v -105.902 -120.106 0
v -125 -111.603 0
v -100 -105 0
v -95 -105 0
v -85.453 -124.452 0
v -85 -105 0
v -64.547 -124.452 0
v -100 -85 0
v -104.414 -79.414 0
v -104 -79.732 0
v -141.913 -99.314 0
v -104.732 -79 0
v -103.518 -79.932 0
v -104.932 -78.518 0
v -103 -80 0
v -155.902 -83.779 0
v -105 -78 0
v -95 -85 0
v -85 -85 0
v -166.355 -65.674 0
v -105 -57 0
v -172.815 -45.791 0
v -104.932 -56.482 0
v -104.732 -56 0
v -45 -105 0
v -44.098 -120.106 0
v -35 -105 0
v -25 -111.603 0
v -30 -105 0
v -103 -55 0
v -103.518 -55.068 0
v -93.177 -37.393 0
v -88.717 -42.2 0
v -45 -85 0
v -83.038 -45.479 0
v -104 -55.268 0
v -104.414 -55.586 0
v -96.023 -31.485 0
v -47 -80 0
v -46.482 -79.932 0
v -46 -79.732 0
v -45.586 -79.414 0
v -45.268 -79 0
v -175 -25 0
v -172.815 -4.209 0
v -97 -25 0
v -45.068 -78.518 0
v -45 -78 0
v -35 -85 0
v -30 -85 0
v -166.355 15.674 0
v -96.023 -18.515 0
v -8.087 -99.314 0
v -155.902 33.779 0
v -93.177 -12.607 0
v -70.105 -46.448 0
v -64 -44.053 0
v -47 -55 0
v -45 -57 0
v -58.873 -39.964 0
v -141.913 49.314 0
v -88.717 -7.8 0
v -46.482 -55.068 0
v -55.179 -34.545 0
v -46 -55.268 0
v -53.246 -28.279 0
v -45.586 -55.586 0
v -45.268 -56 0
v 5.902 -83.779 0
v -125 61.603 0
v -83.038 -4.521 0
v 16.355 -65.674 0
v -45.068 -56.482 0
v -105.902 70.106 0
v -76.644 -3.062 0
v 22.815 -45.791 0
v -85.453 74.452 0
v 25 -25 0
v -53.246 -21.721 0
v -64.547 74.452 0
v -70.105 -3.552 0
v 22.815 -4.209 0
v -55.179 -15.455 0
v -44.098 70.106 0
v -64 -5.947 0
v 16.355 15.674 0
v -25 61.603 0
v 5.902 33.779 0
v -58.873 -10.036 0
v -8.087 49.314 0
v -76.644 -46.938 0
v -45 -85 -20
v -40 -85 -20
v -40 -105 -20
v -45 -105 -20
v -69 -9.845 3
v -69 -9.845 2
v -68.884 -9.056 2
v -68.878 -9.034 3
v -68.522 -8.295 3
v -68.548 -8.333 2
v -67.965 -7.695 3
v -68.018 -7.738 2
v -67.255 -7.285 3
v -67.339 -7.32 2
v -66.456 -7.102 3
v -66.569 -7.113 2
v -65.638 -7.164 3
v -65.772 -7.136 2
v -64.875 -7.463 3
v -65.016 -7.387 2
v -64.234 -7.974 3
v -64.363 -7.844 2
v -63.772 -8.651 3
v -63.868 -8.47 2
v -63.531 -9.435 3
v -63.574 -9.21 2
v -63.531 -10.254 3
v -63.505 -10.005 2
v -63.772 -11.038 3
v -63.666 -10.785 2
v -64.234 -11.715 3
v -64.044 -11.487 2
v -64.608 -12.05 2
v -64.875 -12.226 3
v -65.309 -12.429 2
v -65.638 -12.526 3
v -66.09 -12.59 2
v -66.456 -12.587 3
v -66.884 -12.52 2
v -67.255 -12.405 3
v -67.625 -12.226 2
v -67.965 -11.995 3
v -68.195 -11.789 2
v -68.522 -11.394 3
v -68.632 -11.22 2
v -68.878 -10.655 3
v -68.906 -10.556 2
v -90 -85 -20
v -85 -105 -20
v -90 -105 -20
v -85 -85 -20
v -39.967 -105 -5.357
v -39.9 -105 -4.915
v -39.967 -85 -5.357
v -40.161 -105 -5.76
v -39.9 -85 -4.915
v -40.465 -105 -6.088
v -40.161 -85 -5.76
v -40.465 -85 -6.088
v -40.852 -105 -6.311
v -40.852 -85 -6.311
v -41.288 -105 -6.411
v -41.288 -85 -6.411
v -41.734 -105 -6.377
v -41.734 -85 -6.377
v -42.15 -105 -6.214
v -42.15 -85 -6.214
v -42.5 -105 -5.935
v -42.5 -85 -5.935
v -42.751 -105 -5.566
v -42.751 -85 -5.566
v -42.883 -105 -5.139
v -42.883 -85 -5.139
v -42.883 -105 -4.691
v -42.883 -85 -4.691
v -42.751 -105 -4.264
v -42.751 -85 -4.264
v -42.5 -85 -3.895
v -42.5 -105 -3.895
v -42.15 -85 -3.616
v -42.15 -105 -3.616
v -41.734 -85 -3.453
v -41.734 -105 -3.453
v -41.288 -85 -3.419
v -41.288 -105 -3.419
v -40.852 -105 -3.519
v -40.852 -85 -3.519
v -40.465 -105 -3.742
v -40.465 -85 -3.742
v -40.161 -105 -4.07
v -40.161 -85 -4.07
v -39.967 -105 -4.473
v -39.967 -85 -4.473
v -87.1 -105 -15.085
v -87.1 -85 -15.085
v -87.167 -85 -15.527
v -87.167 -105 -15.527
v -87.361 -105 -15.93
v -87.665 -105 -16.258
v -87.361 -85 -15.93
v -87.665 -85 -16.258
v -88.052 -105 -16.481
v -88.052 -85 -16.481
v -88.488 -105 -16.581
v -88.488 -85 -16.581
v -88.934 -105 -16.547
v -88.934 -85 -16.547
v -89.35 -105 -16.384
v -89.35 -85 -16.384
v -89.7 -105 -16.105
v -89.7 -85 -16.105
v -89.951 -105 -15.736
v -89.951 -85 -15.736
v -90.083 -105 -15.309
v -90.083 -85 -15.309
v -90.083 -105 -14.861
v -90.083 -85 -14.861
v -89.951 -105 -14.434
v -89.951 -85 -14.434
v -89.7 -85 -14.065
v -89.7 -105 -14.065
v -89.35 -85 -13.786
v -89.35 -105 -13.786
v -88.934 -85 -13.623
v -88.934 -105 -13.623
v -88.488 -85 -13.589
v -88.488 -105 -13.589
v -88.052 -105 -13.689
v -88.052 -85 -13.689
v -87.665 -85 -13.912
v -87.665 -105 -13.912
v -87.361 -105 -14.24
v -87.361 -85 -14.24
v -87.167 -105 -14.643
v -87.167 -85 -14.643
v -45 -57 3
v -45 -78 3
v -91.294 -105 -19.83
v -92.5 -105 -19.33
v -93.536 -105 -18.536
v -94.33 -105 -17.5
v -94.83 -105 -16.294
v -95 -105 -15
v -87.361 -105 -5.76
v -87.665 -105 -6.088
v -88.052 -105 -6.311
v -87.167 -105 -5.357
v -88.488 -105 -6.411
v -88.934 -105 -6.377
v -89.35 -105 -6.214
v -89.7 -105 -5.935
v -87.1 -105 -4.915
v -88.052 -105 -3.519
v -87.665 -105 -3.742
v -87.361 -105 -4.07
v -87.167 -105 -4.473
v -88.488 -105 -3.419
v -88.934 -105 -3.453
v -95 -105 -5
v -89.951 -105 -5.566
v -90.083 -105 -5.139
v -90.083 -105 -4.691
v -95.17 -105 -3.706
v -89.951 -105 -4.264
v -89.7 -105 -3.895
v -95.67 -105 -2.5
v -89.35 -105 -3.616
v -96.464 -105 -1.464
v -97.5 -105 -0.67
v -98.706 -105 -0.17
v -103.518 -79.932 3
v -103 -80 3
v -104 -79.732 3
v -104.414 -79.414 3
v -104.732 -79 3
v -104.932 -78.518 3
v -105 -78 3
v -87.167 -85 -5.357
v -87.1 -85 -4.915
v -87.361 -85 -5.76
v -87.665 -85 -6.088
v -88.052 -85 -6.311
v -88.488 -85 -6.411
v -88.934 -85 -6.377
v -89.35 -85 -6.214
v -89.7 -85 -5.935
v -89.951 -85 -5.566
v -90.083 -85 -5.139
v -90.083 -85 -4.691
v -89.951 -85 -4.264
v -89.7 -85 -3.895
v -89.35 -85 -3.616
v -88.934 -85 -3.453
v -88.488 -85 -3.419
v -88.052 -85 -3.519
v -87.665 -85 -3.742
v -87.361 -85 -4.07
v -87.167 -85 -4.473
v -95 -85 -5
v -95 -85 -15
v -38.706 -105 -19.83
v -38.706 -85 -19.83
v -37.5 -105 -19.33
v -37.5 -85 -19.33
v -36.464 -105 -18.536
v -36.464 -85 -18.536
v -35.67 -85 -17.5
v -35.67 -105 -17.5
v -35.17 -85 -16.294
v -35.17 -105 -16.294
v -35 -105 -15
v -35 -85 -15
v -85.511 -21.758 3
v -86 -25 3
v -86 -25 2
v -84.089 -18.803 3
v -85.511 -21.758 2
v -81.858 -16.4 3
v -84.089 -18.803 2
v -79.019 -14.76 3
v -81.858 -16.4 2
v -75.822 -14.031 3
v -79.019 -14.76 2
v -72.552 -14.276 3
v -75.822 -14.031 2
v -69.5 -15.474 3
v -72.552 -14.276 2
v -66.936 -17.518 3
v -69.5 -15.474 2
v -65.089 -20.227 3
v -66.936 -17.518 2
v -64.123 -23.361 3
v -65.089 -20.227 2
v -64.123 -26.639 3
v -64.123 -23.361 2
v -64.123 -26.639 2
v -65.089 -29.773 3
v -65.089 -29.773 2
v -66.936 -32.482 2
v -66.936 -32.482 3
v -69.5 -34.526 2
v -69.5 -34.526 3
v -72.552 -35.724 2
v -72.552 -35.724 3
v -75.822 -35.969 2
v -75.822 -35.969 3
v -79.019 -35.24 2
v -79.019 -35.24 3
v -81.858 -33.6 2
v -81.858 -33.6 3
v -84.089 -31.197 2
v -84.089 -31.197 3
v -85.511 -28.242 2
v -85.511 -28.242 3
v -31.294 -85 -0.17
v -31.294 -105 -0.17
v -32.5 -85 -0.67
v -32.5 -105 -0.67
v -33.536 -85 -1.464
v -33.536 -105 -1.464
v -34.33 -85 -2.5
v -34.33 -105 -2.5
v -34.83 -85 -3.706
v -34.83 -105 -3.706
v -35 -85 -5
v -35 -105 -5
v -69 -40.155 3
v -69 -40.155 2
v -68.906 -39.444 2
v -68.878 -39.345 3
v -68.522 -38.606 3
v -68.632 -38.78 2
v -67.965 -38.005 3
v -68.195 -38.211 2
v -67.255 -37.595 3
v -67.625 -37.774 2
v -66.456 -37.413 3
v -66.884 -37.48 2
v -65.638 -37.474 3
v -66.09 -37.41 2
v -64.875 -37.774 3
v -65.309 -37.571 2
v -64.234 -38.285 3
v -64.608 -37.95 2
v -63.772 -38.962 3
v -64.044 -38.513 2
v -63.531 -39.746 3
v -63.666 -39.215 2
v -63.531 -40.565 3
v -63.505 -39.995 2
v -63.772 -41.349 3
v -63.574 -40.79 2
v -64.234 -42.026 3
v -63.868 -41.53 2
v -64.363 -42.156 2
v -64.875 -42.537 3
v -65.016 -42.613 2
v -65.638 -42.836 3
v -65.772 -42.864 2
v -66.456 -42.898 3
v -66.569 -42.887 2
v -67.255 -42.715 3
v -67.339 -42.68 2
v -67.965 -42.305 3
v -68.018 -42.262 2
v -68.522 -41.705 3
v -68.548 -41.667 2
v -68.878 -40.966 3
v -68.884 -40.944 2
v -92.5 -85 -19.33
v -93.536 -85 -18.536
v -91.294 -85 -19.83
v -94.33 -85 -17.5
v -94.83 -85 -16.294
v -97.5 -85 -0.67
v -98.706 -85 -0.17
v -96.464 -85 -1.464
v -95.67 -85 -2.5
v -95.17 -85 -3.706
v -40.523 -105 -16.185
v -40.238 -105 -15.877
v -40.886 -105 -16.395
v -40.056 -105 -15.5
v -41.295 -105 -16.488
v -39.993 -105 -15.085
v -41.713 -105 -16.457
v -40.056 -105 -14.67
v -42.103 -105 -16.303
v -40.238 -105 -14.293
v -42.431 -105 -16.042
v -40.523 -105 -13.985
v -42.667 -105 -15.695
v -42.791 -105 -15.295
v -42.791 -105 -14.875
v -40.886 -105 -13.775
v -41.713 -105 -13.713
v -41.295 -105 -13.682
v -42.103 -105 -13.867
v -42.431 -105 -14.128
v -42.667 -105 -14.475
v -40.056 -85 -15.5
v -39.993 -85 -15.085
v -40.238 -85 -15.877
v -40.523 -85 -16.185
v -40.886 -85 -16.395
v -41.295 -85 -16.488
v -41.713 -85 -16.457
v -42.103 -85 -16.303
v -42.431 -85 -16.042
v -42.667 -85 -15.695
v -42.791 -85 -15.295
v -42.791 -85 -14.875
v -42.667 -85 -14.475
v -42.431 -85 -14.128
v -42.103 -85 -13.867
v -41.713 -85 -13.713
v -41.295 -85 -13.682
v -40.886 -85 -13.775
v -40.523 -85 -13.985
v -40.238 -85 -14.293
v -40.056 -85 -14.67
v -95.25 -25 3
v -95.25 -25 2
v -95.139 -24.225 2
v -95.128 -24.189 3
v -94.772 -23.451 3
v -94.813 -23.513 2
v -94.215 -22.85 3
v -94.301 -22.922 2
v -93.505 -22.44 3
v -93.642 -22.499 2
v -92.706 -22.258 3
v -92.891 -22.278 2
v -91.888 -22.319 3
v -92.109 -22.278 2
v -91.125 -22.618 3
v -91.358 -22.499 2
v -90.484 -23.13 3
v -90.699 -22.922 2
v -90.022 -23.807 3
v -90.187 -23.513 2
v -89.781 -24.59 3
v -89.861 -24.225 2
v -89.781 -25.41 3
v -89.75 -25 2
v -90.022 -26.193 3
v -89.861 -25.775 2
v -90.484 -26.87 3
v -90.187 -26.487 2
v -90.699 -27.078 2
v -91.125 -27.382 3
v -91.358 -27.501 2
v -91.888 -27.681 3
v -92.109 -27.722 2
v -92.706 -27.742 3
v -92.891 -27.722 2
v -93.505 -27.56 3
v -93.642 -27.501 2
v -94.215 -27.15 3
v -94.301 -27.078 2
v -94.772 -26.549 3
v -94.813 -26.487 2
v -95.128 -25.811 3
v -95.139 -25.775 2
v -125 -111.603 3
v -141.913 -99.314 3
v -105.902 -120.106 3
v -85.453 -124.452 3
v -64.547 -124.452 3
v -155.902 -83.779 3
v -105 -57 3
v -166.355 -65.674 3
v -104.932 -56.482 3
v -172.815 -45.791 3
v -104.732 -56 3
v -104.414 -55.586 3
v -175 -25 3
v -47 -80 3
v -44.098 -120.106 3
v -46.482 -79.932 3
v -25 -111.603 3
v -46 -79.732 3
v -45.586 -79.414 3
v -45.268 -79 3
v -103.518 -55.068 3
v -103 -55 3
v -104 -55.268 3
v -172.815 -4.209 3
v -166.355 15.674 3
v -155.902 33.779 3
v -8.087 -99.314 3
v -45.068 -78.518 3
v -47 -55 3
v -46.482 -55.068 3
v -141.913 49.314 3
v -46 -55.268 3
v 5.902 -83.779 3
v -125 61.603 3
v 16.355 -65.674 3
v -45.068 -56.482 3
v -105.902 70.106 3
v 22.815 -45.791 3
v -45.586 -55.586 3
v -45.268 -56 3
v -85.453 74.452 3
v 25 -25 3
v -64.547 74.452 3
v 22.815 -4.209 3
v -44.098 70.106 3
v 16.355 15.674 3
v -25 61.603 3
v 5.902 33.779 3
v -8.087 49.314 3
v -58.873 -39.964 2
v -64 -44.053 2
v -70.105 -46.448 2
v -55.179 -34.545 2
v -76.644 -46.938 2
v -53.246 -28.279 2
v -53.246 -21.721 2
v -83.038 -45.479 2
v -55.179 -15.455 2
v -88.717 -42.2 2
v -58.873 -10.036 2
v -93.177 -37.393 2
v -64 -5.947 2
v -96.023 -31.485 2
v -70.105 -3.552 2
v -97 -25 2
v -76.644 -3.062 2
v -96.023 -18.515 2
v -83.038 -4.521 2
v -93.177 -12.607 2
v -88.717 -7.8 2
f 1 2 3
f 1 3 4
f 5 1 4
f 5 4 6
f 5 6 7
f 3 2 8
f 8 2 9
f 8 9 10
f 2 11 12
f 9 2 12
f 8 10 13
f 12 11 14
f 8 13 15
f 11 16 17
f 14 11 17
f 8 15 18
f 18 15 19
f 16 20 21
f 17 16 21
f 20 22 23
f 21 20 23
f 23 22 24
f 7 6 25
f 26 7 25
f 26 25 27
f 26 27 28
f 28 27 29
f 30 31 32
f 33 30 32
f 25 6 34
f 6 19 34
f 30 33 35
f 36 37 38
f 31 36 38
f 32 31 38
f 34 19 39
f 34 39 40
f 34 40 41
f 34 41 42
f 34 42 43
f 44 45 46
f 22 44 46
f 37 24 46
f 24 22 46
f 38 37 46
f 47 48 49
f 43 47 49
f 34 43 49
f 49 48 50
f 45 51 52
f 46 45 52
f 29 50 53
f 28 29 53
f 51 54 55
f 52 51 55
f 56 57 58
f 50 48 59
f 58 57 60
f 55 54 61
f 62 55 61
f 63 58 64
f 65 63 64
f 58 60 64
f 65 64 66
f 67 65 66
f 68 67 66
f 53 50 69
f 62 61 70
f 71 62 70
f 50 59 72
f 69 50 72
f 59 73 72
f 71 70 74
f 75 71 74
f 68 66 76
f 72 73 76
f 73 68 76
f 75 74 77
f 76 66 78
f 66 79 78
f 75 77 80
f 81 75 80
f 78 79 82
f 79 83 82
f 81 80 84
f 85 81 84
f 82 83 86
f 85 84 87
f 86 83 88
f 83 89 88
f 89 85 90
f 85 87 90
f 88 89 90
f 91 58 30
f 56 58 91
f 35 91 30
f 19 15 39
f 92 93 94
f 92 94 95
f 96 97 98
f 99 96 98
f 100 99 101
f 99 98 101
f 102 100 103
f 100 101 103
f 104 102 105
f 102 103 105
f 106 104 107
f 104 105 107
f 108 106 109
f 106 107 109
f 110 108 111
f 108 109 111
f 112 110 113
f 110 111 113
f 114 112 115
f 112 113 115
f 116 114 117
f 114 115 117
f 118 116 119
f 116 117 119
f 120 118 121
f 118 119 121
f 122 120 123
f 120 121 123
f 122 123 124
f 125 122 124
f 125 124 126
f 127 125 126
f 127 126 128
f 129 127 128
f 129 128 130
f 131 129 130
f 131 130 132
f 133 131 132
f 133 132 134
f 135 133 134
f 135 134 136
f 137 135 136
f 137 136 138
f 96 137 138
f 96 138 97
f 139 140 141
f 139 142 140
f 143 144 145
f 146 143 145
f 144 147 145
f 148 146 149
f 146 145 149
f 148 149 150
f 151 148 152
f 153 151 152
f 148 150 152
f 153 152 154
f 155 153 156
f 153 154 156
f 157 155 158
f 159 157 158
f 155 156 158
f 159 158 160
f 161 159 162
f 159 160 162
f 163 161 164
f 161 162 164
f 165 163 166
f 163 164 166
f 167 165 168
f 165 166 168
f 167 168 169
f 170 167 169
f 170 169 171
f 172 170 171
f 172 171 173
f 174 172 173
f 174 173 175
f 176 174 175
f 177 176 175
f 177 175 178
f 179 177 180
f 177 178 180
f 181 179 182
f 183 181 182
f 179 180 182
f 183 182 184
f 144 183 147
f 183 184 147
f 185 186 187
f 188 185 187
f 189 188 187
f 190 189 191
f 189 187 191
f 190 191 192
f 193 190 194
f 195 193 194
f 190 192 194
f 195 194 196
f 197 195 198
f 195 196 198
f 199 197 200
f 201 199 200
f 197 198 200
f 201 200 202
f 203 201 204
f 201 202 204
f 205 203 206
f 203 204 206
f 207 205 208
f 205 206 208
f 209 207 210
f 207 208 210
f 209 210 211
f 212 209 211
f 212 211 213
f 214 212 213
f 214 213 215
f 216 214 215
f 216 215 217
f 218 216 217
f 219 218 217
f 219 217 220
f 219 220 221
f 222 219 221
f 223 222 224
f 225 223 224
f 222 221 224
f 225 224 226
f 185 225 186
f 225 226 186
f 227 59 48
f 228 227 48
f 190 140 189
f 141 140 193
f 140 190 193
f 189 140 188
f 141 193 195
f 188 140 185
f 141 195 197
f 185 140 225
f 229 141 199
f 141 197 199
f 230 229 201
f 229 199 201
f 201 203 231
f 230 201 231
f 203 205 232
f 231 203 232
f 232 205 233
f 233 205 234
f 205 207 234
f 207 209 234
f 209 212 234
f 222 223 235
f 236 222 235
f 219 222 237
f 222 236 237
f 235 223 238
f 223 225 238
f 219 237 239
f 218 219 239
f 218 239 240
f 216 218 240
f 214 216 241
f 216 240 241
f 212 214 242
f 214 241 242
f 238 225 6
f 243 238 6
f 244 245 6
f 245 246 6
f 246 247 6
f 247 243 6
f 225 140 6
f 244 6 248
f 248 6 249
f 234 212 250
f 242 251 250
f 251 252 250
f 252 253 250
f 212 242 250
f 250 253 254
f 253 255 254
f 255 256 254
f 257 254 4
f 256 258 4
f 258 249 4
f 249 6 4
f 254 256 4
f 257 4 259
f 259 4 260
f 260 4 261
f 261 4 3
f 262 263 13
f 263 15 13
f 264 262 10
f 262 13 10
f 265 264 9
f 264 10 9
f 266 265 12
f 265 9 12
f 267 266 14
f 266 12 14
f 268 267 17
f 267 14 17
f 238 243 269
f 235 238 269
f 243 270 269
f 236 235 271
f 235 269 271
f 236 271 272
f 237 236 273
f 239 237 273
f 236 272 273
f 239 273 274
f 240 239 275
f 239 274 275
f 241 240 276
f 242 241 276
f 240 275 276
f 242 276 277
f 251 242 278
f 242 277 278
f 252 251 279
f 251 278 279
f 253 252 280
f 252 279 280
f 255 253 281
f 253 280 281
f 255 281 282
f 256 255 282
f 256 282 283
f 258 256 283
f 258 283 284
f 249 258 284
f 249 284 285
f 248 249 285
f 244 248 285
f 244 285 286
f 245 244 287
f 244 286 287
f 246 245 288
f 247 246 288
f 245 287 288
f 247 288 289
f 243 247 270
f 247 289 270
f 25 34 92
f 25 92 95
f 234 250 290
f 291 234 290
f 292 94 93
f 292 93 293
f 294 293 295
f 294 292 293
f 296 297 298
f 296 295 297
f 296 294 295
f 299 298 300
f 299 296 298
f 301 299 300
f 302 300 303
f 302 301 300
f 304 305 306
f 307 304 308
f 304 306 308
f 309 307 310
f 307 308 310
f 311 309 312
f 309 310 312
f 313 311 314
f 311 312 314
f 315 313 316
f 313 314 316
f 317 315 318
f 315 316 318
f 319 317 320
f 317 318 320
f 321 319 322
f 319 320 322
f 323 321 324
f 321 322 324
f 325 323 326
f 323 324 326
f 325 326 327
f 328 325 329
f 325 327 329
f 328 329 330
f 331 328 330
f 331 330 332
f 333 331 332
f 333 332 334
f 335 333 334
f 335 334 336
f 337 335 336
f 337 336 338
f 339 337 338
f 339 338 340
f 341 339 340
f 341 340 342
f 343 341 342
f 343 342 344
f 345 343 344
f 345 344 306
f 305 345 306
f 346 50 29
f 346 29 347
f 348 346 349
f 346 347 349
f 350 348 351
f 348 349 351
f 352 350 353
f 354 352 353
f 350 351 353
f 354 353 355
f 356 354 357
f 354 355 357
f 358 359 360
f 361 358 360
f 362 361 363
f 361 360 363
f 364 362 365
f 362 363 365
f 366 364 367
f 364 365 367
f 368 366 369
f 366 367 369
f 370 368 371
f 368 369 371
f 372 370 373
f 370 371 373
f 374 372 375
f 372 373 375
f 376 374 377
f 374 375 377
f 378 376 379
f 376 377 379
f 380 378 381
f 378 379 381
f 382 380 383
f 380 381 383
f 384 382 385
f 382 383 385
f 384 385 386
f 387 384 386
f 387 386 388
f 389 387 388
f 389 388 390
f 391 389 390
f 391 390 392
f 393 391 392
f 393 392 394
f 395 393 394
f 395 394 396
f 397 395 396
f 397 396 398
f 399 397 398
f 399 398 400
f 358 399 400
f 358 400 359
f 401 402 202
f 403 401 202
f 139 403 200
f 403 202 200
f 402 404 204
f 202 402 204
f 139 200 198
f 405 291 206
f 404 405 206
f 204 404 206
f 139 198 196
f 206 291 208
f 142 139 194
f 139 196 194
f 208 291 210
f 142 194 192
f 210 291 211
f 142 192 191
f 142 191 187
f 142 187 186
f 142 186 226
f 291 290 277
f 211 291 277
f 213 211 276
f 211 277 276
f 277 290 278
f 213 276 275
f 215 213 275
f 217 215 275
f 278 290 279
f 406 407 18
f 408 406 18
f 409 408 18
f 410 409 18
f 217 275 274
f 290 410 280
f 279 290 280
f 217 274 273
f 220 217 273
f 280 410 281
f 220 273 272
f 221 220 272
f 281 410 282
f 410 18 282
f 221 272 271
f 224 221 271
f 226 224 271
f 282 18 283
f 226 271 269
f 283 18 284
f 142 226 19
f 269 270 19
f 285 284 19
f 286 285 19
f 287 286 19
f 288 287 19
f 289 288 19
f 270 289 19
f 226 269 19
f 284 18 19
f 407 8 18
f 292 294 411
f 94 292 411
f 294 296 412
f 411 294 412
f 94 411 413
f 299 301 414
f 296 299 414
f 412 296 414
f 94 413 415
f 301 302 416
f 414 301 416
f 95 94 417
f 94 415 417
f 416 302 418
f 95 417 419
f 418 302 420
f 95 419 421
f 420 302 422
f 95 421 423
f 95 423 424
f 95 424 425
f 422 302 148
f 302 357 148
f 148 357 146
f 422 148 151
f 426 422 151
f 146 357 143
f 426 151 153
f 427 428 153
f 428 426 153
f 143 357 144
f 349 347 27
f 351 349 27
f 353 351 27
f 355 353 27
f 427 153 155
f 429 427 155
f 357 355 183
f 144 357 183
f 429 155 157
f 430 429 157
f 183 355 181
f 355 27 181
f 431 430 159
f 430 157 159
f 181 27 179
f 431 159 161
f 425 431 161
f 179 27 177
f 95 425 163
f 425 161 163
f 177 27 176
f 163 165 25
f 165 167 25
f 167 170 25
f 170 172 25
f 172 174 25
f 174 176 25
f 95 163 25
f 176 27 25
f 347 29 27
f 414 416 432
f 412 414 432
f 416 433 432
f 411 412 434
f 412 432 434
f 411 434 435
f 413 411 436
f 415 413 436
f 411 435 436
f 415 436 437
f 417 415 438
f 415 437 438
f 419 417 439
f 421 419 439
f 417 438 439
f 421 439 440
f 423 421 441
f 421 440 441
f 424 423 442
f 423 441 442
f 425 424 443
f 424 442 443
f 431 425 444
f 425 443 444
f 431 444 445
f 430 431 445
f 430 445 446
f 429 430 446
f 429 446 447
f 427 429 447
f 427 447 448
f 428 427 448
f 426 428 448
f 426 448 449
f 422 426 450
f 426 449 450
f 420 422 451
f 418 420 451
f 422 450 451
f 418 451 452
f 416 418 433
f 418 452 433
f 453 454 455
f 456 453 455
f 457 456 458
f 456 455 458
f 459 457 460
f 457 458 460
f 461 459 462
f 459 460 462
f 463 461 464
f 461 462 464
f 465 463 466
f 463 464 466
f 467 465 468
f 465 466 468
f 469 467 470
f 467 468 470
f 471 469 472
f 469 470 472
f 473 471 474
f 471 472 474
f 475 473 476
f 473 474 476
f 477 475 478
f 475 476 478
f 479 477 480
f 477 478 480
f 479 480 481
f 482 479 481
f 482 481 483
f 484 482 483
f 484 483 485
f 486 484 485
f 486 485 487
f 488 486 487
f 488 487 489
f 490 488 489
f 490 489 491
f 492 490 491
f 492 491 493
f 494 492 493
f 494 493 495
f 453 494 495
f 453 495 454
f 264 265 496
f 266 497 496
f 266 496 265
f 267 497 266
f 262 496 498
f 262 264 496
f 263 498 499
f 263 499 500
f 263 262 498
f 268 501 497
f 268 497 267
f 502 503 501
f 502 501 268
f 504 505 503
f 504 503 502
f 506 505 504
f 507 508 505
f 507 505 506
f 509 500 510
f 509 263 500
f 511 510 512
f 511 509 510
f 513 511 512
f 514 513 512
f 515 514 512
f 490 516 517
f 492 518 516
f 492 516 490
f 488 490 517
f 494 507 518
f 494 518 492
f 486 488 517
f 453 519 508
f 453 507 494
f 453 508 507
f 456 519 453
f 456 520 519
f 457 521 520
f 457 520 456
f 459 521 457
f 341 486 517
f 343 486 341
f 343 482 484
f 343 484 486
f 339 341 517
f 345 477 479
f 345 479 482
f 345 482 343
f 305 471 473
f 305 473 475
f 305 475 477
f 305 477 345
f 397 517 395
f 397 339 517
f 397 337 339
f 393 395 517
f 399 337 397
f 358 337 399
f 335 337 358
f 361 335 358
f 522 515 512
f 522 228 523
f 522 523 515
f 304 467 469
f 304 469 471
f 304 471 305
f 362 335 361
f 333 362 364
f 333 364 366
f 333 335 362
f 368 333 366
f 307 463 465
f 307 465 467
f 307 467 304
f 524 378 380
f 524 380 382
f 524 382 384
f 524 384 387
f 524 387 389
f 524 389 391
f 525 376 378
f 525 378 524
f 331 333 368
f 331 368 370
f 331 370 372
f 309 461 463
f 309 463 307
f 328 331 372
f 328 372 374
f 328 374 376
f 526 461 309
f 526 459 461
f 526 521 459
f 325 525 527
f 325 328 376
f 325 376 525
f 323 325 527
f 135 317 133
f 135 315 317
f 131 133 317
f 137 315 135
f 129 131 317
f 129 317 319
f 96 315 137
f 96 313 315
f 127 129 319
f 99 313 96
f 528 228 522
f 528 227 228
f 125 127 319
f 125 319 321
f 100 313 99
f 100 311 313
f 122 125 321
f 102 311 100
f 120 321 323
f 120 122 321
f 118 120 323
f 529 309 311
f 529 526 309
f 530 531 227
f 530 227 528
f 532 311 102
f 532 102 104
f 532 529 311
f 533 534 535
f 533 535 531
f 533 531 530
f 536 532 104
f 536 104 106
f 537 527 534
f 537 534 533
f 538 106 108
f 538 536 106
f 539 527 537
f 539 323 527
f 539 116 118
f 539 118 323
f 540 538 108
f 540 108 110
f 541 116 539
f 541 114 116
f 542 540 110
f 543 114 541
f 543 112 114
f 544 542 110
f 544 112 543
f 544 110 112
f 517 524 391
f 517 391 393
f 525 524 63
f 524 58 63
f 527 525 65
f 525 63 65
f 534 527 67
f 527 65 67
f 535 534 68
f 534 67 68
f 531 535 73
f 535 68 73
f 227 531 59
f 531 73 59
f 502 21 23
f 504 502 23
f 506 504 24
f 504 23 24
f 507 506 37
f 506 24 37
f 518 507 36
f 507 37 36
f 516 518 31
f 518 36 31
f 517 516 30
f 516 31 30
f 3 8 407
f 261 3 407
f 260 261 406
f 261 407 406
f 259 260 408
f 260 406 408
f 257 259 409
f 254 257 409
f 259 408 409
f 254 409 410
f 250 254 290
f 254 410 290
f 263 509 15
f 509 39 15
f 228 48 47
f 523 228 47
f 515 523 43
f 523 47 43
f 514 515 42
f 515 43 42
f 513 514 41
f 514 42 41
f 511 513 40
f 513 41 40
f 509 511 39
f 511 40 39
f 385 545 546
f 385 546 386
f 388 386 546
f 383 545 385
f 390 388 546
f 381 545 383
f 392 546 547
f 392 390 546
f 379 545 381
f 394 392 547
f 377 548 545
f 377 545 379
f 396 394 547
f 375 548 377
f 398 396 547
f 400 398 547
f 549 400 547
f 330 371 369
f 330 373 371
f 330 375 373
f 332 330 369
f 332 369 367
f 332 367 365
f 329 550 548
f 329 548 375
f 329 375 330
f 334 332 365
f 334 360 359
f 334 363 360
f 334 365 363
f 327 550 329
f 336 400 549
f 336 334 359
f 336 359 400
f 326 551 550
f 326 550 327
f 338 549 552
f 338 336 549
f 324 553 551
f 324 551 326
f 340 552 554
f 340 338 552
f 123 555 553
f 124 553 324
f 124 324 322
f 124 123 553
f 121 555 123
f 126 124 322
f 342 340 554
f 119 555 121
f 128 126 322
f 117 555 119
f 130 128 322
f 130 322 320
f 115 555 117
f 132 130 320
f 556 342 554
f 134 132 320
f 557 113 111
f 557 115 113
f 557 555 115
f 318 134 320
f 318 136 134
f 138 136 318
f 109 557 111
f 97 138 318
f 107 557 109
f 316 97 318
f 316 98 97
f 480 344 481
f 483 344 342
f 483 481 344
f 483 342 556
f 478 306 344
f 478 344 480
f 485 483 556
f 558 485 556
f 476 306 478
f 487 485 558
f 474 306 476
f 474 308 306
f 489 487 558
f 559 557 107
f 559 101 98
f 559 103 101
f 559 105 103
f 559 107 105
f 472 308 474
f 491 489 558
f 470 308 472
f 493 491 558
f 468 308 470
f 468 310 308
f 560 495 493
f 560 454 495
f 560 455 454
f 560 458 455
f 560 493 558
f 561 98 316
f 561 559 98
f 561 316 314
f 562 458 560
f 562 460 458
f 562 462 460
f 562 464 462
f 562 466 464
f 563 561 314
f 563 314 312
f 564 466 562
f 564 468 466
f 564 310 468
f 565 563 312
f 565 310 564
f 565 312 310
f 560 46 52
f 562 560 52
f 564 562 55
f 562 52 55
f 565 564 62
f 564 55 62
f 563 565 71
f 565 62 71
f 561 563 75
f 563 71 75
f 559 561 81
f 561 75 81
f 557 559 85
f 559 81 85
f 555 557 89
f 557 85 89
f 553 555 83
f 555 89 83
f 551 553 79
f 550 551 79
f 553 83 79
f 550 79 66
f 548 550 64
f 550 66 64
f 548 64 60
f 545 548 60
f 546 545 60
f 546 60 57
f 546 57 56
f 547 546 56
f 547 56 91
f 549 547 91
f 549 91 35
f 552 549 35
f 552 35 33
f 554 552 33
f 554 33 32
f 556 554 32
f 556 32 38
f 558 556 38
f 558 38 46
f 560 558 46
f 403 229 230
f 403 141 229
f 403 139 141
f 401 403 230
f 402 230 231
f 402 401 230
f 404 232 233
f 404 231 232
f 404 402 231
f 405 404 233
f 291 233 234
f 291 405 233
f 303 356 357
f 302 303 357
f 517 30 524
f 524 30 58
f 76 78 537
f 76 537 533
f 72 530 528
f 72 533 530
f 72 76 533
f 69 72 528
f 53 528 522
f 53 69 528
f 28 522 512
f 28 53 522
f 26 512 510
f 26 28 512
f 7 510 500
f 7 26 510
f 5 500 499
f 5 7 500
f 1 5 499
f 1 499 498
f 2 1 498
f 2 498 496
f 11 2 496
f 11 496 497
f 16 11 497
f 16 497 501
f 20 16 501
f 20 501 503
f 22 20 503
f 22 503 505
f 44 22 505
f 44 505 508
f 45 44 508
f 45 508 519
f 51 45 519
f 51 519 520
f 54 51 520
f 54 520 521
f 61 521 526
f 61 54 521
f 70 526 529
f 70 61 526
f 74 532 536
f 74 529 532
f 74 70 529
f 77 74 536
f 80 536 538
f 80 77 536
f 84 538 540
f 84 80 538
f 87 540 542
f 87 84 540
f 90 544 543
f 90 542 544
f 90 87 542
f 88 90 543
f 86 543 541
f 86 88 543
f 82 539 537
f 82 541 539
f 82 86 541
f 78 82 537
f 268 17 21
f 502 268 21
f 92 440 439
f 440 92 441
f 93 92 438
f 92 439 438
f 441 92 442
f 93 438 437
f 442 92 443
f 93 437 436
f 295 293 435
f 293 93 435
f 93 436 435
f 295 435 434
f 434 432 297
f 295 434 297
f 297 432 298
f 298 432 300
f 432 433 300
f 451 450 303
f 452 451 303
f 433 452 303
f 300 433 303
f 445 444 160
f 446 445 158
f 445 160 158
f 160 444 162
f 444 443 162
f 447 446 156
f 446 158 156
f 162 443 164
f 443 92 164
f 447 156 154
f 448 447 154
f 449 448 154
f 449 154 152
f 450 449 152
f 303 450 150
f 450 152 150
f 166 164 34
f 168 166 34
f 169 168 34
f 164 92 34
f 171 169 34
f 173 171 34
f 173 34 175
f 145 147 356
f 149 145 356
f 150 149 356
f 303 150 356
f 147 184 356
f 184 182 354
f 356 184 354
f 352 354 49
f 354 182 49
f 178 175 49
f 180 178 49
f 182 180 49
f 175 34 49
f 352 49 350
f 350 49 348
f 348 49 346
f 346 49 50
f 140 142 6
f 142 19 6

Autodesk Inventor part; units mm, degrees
ref_plane "YZ Plane" through (0, 0, 0) normal (1, 0, 0) x (0, 1, 0)
ref_plane "XZ Plane" through (0, 0, 0) normal (0, 1, 0) x (-1, 0, 0)
ref_plane "XY Plane" through (0, 0, 0) normal (0, 0, 1) x (1, 0, 0)
ref_plane "Work Plane1" through (0, 0, 0) normal (0, 0, 1) x (1, 0, 0)
ref_plane "Work Plane2" through (0, 0, 0) normal (0, 0, 1) x (1, 0, 0)
sketch "Sketch3" plane through (0, 0, 0) normal (0, 0, 1) x (1, 0, 0)
  circle A0 centre (-75, -25) radius 100 projected
  circle A1 centre (-75, -25) radius 95 projected
  point P0 (-75, -25)
  point P1 (-75, -25)
  point P2 (-75, -25)
  point P3 (-75, -25)
extrude "Extrusion3" add sketch "Sketch3" along normal blind 3 contours A0 | A1
sketch "Sketch9" plane through (0, 0, 0) normal (0, 0, -1) x (-1, 0, 0)
  line L0 (115, -125) -> (35, -125) projected
  line L1 (35, -105) -> (95, -105)
  line L2 (95, -105) -> (95, -85)
  line L3 (95, -85) -> (35, -85)
  line L4 (35, -85) -> (35, -105)
  line L5 (35, -105) -> (95, -85) construction
  line L6 (95, -105) -> (35, -85) construction
  arc A0 (120.4545, -114.0724) -> (120.4545, 64.0724) centre (75, -25) ccw projected
  line L7 (85, -85) -> (85, -105)
  line L8 (45, -85) -> (45, -105)
  point P0 (0, 0)
  point P1 (105.3097, -125)
  point P2 (44.6903, -125)
  point P3 (65, -95)
  point P4 (111.3636, 68.1541)
  point P5 (111.3636, -118.1541)
  point P6 (95, -95)
  point P7 (85, -95)
  point P8 (35, -95)
  point P9 (45, -95)
  dimension "d48" = 60
  dimension "d49" = 20
  dimension "d53" = 10
  dimension "d54" = 10
  dimension "d56" = 20
  dimension "d57" = 20
extrude "Extrusion10" add sketch "Sketch9" along normal blind 20 contours L4 L3 L8 L1 | L7 L3 L2 L1
sketch "Sketch11" plane through (-45, -85, 0) normal (0, 1, 0) x (1, 0, 0)
  circle A0 centre (3.6, 4.915) radius 1.5
  line L0 (0, 20) -> (10, 20) projected
  line L1 (0, 0) -> (0, 20) projected
  circle A1 centre (-43.6, 4.915) radius 1.5
  line L2 (-50, 20) -> (-40, 20) projected
  line L3 (-40, 0) -> (-40, 20) projected
  line L4 (10, 0) -> (-70, 0) projected
  circle A2 centre (3.6, 15.085) radius 1.4068
  circle A3 centre (-43.6, 15.085) radius 1.5
  point P0 (45, 0)
  point P1 (5, 20)
  point P2 (0.3097, 0)
  point P3 (-60.3097, 0)
  dimension "d58" = 3
  dimension "d60" = 3.6
  dimension "d61" = 3
  dimension "d63" = 3.6
  dimension "d66" = 4.915
  dimension "d67" = 4.915
  dimension "d91" = 10.17
  dimension "d92" = 3
  dimension "d94" = 10.17
extrude "Extrusion12" cut sketch "Sketch11" against normal blind 20
sketch "Sketch12" plane through (0, 0, 0) normal (0, 0, -1) x (-1, 0, 0)
  line L0 (35, -105) -> (35, -85) projected
  line L1 (35, -85) -> (45, -85) projected
  line L2 (45, -85) -> (45, -105) projected
  line L3 (45, -105) -> (35, -105) projected
  line L4 (95, -85) -> (95, -105) projected
  line L5 (95, -105) -> (85, -105) projected
  line L6 (85, -105) -> (85, -85) projected
  line L7 (85, -85) -> (95, -85) projected
  circle A0 centre (75, -25) radius 11
  circle A1 centre (75, -25) radius 22
  circle A2 centre (75, -25) radius 100 projected
  line L8 (75, -25) -> (92.5, -25)
  circle A3 centre (92.5, -25) radius 2.75
  line L9 (75, -25) -> (66.25, -9.8446)
  circle A4 centre (66.25, -9.8446) radius 2.75
  line L10 (75, -25) -> (66.25, -40.1554)
  circle A5 centre (66.25, -40.1554) radius 2.75
  point P0 (0, 0)
  point P1 (38.6364, 68.1541)
  point P2 (38.6364, -118.1541)
  dimension "d70" = 22
  dimension "d71" = 44
  dimension "d76" = 17.5
  dimension "d77" = 5.5
extrude "Extrusion13" cut sketch "Sketch12" against normal blind 35 contours L8 L9 A0 | A0 L10 L8 | L9 L10 A0
extrude "Extrusion14" cut sketch "Sketch12" against normal blind 2 contours A5 | A4 | A3 | A1
extrude "Extrusion15" cut sketch "Sketch12" against normal blind 3 contours A5 | A4 | A3
sketch "Sketch13" plane through (0, 0, 0) normal (0, 0, -1) x (-1, 0, 0)
  point P0 (0, 0)
sketch "Sketch14" plane through (0, 0, 0) normal (0, 0, -1) x (-1, 0, 0)
  line L0 (47, -80) -> (103, -80)
  line L1 (105, -78) -> (105, -57)
  line L2 (103, -55) -> (47, -55)
  line L3 (45, -57) -> (45, -78)
  line L4 (115, -125) -> (35, -125) projected
  circle A0 centre (75, -25) radius 11 projected
  arc A1 (47, -55) -> (45, -57) centre (47, -57) ccw
  arc A2 (103, -80) -> (105, -78) centre (103, -78) ccw
  arc A3 (47, -55) -> (45, -57) centre (47, -57) ccw
  arc A4 (45, -78) -> (47, -80) centre (47, -78) ccw
  arc A5 (105, -57) -> (103, -55) centre (103, -57) ccw
  point P0 (0, 0)
  point P1 (105, -55)
  point P2 (105, -80)
  point P3 (45, -55)
  point P4 (105.3097, -125)
  point P5 (44.6903, -125)
  dimension "d84" = 60
  dimension "d85" = 25
  dimension "d86" = 45
  dimension "d87" = 30
  dimension "d88" = 2
extrude "Extrusion16" cut sketch "Sketch14" against normal blind 20 contours A4 L3 A1 L2 A5 L1 A2 L0
fillet "Fillet1" radius 5 4 edges at (-35, -95, -20) (-35, -95, 0) (-95, -95, 0) (-95, -95, -20)
properties part number "Pokrywa_góra"
